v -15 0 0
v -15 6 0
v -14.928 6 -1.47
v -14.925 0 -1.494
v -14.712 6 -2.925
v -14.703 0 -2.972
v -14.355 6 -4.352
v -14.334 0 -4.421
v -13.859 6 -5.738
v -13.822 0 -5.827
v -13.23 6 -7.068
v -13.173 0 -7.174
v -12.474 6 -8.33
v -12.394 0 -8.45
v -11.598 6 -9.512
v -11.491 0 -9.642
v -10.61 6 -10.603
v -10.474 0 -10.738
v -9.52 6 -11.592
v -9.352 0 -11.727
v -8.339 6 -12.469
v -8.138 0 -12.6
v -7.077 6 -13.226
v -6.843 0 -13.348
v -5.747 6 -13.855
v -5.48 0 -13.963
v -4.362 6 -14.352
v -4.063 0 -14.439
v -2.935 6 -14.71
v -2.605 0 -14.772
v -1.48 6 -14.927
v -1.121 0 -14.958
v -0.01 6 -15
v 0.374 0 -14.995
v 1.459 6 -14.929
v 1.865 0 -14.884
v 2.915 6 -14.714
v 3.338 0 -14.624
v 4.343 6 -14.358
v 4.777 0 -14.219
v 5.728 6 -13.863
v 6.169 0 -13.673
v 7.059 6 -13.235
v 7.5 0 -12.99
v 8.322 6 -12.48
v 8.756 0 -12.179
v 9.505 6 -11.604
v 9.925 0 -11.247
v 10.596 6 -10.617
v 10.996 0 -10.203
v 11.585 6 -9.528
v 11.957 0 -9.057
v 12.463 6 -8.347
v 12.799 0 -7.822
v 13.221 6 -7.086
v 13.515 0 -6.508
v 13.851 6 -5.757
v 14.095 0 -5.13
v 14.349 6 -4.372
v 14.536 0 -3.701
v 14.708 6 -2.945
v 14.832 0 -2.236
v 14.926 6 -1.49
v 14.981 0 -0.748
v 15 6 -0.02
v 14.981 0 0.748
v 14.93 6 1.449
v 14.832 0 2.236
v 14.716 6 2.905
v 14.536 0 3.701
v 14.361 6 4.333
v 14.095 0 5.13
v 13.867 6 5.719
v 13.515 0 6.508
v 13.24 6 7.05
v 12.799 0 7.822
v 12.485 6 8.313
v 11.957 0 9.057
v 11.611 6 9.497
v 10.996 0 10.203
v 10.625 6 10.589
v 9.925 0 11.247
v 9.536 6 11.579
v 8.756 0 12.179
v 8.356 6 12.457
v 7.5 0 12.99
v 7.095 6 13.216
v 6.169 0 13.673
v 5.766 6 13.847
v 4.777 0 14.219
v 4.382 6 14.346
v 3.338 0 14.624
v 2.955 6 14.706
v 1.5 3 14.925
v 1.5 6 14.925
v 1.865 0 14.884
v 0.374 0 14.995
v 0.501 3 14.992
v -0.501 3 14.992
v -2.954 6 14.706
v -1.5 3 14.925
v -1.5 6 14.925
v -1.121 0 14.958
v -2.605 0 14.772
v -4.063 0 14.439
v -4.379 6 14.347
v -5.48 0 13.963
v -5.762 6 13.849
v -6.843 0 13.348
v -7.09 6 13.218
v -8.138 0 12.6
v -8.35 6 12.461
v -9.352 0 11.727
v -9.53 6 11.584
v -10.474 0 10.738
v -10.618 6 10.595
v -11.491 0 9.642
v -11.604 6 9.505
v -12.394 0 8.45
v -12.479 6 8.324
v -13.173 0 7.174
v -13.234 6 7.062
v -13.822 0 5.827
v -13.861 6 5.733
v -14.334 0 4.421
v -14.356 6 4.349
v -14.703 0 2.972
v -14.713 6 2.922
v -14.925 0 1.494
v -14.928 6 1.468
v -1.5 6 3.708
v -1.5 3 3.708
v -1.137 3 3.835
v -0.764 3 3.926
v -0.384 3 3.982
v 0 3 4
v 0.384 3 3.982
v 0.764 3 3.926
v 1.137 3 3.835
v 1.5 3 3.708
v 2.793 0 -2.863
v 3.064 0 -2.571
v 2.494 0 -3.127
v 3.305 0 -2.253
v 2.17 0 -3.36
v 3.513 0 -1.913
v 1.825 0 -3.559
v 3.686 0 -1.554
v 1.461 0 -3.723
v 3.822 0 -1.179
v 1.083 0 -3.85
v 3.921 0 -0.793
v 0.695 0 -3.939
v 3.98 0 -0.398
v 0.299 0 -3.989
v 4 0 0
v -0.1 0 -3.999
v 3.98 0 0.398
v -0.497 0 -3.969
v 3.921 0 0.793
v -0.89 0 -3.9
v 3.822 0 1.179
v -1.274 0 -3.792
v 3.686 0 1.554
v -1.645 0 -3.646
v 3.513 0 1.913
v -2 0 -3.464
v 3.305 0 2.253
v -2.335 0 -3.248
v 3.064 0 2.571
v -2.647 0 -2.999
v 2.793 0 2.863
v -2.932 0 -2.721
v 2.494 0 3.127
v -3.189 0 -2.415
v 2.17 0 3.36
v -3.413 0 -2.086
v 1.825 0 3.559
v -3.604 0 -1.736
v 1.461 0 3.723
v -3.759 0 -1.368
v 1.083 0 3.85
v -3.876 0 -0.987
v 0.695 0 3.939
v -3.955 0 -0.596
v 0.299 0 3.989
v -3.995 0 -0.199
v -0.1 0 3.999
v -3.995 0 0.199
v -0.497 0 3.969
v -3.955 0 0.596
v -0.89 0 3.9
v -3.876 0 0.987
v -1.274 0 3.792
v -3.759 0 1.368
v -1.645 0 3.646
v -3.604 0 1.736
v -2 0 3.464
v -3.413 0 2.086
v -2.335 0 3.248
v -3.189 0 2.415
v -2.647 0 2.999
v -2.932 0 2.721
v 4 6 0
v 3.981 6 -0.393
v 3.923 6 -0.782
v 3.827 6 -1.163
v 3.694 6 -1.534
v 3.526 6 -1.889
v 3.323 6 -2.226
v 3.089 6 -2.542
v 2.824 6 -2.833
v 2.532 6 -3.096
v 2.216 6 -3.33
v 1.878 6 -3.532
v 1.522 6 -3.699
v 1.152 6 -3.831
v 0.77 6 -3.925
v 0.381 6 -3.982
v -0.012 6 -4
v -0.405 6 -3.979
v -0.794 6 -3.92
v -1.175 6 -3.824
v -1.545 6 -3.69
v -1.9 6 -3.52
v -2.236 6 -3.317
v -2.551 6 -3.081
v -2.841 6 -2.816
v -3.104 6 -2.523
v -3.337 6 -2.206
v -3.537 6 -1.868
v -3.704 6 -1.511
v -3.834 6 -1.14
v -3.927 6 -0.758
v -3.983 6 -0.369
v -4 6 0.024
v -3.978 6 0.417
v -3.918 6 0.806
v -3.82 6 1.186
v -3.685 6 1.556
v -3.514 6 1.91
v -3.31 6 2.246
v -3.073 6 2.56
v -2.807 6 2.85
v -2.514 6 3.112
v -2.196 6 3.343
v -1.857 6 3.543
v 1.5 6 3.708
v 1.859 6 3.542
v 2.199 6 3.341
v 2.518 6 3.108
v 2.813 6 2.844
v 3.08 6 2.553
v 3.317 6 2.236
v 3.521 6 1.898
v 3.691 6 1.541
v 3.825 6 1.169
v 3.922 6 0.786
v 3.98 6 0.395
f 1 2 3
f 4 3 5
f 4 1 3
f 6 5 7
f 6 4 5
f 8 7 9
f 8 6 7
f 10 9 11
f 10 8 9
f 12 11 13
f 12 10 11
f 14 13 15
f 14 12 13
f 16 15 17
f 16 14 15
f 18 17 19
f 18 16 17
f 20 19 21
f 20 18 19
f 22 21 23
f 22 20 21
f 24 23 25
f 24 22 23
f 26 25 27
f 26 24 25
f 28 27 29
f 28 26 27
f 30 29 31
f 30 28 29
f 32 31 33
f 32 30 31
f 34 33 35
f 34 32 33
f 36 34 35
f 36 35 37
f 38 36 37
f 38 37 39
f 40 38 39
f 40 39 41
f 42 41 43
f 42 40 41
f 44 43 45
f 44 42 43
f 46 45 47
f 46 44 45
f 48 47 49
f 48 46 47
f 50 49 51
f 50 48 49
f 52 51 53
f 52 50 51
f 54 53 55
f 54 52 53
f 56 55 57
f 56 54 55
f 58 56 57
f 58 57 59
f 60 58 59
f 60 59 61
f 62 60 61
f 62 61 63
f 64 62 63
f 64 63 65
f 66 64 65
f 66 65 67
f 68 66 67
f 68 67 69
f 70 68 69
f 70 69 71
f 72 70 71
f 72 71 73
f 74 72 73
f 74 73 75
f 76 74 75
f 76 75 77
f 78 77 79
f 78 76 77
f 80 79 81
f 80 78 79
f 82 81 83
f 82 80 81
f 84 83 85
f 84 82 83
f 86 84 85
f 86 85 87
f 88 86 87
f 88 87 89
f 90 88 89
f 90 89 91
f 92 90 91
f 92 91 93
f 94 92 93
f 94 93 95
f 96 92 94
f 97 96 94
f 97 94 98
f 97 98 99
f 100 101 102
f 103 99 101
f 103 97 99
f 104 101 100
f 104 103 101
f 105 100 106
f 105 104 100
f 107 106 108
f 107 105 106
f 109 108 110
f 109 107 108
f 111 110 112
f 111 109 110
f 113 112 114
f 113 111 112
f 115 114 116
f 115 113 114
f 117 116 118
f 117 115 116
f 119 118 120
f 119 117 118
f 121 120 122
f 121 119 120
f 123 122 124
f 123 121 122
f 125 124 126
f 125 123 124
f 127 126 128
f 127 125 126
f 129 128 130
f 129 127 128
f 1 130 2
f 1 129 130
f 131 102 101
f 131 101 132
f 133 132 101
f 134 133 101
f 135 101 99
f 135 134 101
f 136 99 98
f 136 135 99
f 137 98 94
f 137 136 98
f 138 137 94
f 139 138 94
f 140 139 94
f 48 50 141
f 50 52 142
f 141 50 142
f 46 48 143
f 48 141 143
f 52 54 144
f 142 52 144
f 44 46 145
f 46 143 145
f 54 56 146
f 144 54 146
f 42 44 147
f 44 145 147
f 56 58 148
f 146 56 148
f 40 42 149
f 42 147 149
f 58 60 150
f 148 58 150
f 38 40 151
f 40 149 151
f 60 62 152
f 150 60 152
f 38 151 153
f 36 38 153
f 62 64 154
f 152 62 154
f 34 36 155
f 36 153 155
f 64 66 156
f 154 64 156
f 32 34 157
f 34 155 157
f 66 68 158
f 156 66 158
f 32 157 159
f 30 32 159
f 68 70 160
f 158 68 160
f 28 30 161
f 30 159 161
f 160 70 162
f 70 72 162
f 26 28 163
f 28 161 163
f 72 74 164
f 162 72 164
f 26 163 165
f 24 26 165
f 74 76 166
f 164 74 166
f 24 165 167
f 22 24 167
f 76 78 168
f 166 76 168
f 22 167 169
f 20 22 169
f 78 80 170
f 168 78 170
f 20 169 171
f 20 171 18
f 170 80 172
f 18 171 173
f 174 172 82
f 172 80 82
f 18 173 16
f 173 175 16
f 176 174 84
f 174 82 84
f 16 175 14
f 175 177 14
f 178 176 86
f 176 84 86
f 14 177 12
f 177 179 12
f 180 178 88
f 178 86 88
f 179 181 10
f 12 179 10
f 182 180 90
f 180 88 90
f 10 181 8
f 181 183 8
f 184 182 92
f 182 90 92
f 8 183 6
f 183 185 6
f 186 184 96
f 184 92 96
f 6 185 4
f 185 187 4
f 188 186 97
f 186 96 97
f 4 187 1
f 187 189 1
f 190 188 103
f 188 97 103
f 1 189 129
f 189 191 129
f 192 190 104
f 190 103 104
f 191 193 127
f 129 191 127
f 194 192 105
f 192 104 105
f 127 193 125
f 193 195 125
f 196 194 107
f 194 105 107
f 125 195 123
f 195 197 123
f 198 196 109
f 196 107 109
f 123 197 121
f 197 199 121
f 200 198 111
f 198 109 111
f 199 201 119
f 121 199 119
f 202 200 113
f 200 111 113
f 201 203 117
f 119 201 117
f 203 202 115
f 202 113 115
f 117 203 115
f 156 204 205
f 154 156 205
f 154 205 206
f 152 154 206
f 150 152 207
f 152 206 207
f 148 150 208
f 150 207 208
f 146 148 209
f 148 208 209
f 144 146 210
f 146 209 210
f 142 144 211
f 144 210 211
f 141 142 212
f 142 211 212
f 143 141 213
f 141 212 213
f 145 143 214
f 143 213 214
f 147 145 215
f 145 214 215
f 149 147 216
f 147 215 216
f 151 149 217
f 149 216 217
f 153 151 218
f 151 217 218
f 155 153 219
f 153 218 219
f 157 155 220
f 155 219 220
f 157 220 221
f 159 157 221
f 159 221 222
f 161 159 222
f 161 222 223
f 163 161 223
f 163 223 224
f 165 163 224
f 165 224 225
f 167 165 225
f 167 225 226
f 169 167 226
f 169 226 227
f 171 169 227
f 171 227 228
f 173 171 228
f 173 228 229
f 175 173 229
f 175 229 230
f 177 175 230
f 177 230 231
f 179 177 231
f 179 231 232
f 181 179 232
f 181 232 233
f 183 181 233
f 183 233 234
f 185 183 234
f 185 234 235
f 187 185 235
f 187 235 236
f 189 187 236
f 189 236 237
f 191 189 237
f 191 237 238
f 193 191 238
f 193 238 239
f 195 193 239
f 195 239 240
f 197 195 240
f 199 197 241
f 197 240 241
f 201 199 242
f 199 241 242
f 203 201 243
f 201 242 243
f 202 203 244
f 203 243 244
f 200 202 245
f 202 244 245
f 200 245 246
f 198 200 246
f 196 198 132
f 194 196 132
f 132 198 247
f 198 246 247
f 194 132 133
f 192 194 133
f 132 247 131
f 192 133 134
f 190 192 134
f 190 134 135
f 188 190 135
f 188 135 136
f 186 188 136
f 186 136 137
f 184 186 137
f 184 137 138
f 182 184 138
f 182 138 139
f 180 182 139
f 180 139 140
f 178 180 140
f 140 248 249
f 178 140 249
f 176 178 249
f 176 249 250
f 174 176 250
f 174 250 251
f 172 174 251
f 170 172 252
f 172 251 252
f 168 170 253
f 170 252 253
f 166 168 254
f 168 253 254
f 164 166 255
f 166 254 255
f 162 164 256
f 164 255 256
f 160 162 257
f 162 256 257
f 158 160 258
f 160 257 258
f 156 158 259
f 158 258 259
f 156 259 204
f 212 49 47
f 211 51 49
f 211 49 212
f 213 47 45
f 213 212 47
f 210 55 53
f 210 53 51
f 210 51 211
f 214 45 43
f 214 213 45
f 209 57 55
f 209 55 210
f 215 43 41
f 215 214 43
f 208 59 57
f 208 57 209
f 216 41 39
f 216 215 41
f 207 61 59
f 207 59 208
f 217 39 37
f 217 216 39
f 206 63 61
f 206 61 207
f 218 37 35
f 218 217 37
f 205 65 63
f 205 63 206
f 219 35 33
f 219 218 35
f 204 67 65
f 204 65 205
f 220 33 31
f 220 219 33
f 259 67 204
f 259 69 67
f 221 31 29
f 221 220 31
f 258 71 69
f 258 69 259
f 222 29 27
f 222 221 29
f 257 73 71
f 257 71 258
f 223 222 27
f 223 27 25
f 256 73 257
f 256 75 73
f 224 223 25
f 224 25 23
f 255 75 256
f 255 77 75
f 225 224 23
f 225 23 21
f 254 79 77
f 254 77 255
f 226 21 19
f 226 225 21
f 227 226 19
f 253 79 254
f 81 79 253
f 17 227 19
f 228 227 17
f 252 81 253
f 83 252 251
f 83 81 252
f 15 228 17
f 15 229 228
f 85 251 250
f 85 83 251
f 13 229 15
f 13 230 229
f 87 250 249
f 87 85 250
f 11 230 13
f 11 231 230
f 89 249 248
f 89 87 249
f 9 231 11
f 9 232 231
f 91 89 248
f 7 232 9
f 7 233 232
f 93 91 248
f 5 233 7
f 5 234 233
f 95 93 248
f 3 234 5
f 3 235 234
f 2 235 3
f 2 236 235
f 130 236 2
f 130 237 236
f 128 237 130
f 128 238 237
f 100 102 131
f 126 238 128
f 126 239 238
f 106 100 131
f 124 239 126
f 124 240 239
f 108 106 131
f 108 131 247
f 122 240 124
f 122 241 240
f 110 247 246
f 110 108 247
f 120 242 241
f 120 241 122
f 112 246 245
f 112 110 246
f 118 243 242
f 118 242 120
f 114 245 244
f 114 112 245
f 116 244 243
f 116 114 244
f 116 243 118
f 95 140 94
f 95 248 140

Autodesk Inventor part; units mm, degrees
ref_plane "YZ Plane" through (0, 0, 0) normal (1, 0, 0) x (0, 1, 0)
ref_plane "XZ Plane" through (0, 0, 0) normal (0, 1, 0) x (-1, 0, 0)
ref_plane "XY Plane" through (0, 0, 0) normal (0, 0, 1) x (1, 0, 0)
sketch "スケッチ1" plane through (0, 0, 0) normal (0, 1, 0) x (-1, 0, 0)
  circle A0 centre (0, 0) radius 15
  dimension "d0" = 30
extrude "押し出し1" add sketch "スケッチ1" along normal blind 6
sketch "スケッチ2" plane through (0, 6, 0) normal (0, 1, 0) x (1, 0, 0)
  circle A0 centre (0, 0) radius 3
  dimension "d3" = 6
extrude "押し出し2" cut sketch "スケッチ2" against normal blind 6
sketch "スケッチ3" plane through (0, 6, 0) normal (0, 1, 0) x (1, 0, 0)
  line L0 (-1.5, 0) -> (1.5, 0)
  line L1 (1.5, 0) -> (1.5, -17.8431)
  line L2 (1.5, -17.8431) -> (-1.5, -17.8431)
  line L3 (-1.5, -17.8431) -> (-1.5, 0)
  point P0 (0, 0)
  dimension "d6" = 3
  dimension "d7" = 1.5
extrude "押し出し3" cut sketch "スケッチ3" against normal blind 3
sketch "スケッチ4" plane through (0, 6, 0) normal (0, 1, 0) x (1, 0, 0)
  circle A0 centre (0, 0) radius 4
  dimension "d10" = 8
extrude "押し出し4" cut sketch "スケッチ4" against normal blind 6
properties part number "NHK_t0_1"
